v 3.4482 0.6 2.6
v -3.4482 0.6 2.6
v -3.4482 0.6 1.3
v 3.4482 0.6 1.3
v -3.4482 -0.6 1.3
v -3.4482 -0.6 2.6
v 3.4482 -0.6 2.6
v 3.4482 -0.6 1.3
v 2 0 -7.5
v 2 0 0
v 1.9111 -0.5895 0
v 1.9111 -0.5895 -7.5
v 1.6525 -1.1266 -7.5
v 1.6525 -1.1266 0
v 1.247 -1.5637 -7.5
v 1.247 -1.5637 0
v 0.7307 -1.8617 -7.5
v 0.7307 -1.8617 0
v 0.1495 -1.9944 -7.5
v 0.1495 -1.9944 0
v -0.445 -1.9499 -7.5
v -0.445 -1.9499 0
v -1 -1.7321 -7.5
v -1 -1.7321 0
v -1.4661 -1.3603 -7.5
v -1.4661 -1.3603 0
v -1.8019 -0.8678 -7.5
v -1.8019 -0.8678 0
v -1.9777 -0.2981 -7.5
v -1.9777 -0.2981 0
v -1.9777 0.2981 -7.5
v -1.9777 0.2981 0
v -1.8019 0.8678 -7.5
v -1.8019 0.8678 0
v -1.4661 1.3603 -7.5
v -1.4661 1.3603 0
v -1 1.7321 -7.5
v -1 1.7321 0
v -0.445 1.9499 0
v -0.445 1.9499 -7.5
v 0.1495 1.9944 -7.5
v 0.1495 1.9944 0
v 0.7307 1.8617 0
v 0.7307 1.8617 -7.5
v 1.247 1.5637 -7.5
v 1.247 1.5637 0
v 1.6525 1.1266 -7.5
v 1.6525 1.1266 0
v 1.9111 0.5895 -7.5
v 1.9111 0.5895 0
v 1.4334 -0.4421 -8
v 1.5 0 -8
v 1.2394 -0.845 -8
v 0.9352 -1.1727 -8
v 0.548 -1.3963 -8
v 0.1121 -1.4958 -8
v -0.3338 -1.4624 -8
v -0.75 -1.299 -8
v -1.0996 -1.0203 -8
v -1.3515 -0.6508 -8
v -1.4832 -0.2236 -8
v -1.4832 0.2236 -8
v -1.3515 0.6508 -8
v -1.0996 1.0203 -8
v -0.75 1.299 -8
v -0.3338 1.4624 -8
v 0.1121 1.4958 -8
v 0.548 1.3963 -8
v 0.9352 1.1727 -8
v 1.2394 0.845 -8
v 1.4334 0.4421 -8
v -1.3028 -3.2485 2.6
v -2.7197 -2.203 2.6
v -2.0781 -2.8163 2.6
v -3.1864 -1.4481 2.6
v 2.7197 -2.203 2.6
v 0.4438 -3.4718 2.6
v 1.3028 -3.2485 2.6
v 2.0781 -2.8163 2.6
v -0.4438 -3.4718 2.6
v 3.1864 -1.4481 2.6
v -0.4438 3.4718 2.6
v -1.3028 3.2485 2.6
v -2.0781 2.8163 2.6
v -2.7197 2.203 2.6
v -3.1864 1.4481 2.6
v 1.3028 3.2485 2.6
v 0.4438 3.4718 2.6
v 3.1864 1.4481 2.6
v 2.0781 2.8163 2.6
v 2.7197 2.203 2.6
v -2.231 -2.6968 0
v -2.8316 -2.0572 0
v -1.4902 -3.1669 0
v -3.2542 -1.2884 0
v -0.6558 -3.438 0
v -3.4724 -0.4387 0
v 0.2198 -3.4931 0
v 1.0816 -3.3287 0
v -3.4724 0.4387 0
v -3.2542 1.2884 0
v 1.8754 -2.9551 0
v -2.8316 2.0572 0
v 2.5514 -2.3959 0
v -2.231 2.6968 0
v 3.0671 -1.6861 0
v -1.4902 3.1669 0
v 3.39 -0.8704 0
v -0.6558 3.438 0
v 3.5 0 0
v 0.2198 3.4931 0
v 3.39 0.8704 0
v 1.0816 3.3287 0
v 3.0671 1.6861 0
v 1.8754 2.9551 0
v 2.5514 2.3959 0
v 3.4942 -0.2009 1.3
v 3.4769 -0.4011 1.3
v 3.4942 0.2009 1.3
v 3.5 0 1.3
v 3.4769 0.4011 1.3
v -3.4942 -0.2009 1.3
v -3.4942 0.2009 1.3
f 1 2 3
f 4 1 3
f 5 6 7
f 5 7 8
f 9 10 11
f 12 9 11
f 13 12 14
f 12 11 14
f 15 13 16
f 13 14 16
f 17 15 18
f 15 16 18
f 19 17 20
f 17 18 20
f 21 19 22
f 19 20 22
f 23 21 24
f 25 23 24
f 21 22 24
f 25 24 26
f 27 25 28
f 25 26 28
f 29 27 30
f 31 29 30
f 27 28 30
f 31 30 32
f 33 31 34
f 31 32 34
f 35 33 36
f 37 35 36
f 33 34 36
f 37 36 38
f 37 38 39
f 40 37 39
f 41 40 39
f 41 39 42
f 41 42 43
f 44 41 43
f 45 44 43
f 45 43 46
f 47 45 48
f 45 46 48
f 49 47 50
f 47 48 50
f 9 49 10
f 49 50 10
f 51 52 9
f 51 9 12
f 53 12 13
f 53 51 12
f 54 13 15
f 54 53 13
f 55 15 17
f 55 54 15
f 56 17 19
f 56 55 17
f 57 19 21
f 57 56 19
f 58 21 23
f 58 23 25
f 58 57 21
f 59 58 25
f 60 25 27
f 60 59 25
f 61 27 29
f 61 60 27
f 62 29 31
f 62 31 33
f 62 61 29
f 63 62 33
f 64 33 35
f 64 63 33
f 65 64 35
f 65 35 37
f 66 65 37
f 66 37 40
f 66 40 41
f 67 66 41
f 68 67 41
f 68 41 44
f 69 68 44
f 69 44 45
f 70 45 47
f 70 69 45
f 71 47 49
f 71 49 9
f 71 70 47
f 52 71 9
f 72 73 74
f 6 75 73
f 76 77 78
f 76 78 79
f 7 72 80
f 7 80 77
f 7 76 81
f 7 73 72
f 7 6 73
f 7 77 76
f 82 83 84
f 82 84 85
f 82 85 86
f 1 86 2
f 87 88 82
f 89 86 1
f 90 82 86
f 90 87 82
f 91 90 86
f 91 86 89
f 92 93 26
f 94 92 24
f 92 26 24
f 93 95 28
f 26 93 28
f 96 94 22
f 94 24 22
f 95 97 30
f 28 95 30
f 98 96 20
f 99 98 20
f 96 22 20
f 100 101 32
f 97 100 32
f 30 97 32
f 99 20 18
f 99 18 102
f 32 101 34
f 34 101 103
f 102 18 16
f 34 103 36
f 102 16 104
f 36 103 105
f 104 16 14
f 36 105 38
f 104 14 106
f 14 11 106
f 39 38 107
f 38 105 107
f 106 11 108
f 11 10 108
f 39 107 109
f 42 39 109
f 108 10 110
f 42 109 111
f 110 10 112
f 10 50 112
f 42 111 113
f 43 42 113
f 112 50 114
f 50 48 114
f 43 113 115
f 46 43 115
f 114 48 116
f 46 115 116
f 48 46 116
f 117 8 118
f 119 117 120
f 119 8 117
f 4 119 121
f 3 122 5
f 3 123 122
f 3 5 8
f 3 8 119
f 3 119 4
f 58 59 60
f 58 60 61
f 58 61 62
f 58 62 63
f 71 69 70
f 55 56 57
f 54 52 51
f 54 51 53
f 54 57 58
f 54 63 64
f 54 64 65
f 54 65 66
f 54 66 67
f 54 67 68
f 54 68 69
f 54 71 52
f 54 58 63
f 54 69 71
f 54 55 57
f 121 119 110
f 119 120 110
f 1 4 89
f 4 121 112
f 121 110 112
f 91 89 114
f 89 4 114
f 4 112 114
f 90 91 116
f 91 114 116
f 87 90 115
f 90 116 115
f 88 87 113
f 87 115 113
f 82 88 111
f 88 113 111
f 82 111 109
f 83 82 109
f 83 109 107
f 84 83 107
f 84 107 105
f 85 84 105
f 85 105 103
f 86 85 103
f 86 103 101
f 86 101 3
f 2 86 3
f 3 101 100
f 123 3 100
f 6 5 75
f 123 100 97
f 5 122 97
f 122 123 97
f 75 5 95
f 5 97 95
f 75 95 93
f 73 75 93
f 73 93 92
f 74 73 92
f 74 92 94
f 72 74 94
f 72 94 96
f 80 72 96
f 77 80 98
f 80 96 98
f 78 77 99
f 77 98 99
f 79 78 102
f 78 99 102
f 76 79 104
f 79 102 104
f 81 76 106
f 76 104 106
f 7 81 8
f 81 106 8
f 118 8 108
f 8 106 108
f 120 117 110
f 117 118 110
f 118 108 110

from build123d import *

# Parameters (mm, degrees)
SKETCH_1_R               = 3.5
EXTRUDE_1_DEPTH          = 2.6
SKETCH_2_R               = 2
EXTRUDE_2_DEPTH          = 8
CHAMFER_1_SIZE           = 0.5
CUT_EXTRUDE_1_DEPTH      = 10.407443861
CUT_EXTRUDE_1_DEPTH_BACK = 10.407443861
SKETCH_3_W               = 1.3
SKETCH_3_H               = 1.2


with BuildPart() as part:
    # Эскиз1 → Бобышка-Вытянуть1 (new body)
    with BuildSketch(Plane.XY):
        Circle(SKETCH_1_R)
    extrude(amount=EXTRUDE_1_DEPTH)

    # Эскиз2 → Бобышка-Вытянуть2 (add)
    with BuildSketch(Plane(origin=(0, 0, 0), x_dir=(-1, 0, 0), z_dir=(0, 0, -1))):
        with Locations(Location((0, 0, 0), (0, 0, 180))):
            Circle(SKETCH_2_R)
    extrude(amount=EXTRUDE_2_DEPTH)

    # Фаска1
    chamfer_1_edges = [part.edges().sort_by_distance(p)[0] for p in [
        (-2, 0, -8),
    ]]
    chamfer(chamfer_1_edges, length=CHAMFER_1_SIZE)

    # Эскиз3 → Вырез-Вытянуть1 (cut, two sides: drawn at the far end of the back side and taken through both)
    with BuildSketch(Plane(origin=(0, 0, 0), x_dir=(0, 0, -1), z_dir=(1, 0, 0)).offset(-CUT_EXTRUDE_1_DEPTH_BACK)):
        with Locations((-1.95, 0)):
            Rectangle(SKETCH_3_W, SKETCH_3_H)
    extrude(amount=CUT_EXTRUDE_1_DEPTH + CUT_EXTRUDE_1_DEPTH_BACK, mode=Mode.SUBTRACT)


solid = part.part
